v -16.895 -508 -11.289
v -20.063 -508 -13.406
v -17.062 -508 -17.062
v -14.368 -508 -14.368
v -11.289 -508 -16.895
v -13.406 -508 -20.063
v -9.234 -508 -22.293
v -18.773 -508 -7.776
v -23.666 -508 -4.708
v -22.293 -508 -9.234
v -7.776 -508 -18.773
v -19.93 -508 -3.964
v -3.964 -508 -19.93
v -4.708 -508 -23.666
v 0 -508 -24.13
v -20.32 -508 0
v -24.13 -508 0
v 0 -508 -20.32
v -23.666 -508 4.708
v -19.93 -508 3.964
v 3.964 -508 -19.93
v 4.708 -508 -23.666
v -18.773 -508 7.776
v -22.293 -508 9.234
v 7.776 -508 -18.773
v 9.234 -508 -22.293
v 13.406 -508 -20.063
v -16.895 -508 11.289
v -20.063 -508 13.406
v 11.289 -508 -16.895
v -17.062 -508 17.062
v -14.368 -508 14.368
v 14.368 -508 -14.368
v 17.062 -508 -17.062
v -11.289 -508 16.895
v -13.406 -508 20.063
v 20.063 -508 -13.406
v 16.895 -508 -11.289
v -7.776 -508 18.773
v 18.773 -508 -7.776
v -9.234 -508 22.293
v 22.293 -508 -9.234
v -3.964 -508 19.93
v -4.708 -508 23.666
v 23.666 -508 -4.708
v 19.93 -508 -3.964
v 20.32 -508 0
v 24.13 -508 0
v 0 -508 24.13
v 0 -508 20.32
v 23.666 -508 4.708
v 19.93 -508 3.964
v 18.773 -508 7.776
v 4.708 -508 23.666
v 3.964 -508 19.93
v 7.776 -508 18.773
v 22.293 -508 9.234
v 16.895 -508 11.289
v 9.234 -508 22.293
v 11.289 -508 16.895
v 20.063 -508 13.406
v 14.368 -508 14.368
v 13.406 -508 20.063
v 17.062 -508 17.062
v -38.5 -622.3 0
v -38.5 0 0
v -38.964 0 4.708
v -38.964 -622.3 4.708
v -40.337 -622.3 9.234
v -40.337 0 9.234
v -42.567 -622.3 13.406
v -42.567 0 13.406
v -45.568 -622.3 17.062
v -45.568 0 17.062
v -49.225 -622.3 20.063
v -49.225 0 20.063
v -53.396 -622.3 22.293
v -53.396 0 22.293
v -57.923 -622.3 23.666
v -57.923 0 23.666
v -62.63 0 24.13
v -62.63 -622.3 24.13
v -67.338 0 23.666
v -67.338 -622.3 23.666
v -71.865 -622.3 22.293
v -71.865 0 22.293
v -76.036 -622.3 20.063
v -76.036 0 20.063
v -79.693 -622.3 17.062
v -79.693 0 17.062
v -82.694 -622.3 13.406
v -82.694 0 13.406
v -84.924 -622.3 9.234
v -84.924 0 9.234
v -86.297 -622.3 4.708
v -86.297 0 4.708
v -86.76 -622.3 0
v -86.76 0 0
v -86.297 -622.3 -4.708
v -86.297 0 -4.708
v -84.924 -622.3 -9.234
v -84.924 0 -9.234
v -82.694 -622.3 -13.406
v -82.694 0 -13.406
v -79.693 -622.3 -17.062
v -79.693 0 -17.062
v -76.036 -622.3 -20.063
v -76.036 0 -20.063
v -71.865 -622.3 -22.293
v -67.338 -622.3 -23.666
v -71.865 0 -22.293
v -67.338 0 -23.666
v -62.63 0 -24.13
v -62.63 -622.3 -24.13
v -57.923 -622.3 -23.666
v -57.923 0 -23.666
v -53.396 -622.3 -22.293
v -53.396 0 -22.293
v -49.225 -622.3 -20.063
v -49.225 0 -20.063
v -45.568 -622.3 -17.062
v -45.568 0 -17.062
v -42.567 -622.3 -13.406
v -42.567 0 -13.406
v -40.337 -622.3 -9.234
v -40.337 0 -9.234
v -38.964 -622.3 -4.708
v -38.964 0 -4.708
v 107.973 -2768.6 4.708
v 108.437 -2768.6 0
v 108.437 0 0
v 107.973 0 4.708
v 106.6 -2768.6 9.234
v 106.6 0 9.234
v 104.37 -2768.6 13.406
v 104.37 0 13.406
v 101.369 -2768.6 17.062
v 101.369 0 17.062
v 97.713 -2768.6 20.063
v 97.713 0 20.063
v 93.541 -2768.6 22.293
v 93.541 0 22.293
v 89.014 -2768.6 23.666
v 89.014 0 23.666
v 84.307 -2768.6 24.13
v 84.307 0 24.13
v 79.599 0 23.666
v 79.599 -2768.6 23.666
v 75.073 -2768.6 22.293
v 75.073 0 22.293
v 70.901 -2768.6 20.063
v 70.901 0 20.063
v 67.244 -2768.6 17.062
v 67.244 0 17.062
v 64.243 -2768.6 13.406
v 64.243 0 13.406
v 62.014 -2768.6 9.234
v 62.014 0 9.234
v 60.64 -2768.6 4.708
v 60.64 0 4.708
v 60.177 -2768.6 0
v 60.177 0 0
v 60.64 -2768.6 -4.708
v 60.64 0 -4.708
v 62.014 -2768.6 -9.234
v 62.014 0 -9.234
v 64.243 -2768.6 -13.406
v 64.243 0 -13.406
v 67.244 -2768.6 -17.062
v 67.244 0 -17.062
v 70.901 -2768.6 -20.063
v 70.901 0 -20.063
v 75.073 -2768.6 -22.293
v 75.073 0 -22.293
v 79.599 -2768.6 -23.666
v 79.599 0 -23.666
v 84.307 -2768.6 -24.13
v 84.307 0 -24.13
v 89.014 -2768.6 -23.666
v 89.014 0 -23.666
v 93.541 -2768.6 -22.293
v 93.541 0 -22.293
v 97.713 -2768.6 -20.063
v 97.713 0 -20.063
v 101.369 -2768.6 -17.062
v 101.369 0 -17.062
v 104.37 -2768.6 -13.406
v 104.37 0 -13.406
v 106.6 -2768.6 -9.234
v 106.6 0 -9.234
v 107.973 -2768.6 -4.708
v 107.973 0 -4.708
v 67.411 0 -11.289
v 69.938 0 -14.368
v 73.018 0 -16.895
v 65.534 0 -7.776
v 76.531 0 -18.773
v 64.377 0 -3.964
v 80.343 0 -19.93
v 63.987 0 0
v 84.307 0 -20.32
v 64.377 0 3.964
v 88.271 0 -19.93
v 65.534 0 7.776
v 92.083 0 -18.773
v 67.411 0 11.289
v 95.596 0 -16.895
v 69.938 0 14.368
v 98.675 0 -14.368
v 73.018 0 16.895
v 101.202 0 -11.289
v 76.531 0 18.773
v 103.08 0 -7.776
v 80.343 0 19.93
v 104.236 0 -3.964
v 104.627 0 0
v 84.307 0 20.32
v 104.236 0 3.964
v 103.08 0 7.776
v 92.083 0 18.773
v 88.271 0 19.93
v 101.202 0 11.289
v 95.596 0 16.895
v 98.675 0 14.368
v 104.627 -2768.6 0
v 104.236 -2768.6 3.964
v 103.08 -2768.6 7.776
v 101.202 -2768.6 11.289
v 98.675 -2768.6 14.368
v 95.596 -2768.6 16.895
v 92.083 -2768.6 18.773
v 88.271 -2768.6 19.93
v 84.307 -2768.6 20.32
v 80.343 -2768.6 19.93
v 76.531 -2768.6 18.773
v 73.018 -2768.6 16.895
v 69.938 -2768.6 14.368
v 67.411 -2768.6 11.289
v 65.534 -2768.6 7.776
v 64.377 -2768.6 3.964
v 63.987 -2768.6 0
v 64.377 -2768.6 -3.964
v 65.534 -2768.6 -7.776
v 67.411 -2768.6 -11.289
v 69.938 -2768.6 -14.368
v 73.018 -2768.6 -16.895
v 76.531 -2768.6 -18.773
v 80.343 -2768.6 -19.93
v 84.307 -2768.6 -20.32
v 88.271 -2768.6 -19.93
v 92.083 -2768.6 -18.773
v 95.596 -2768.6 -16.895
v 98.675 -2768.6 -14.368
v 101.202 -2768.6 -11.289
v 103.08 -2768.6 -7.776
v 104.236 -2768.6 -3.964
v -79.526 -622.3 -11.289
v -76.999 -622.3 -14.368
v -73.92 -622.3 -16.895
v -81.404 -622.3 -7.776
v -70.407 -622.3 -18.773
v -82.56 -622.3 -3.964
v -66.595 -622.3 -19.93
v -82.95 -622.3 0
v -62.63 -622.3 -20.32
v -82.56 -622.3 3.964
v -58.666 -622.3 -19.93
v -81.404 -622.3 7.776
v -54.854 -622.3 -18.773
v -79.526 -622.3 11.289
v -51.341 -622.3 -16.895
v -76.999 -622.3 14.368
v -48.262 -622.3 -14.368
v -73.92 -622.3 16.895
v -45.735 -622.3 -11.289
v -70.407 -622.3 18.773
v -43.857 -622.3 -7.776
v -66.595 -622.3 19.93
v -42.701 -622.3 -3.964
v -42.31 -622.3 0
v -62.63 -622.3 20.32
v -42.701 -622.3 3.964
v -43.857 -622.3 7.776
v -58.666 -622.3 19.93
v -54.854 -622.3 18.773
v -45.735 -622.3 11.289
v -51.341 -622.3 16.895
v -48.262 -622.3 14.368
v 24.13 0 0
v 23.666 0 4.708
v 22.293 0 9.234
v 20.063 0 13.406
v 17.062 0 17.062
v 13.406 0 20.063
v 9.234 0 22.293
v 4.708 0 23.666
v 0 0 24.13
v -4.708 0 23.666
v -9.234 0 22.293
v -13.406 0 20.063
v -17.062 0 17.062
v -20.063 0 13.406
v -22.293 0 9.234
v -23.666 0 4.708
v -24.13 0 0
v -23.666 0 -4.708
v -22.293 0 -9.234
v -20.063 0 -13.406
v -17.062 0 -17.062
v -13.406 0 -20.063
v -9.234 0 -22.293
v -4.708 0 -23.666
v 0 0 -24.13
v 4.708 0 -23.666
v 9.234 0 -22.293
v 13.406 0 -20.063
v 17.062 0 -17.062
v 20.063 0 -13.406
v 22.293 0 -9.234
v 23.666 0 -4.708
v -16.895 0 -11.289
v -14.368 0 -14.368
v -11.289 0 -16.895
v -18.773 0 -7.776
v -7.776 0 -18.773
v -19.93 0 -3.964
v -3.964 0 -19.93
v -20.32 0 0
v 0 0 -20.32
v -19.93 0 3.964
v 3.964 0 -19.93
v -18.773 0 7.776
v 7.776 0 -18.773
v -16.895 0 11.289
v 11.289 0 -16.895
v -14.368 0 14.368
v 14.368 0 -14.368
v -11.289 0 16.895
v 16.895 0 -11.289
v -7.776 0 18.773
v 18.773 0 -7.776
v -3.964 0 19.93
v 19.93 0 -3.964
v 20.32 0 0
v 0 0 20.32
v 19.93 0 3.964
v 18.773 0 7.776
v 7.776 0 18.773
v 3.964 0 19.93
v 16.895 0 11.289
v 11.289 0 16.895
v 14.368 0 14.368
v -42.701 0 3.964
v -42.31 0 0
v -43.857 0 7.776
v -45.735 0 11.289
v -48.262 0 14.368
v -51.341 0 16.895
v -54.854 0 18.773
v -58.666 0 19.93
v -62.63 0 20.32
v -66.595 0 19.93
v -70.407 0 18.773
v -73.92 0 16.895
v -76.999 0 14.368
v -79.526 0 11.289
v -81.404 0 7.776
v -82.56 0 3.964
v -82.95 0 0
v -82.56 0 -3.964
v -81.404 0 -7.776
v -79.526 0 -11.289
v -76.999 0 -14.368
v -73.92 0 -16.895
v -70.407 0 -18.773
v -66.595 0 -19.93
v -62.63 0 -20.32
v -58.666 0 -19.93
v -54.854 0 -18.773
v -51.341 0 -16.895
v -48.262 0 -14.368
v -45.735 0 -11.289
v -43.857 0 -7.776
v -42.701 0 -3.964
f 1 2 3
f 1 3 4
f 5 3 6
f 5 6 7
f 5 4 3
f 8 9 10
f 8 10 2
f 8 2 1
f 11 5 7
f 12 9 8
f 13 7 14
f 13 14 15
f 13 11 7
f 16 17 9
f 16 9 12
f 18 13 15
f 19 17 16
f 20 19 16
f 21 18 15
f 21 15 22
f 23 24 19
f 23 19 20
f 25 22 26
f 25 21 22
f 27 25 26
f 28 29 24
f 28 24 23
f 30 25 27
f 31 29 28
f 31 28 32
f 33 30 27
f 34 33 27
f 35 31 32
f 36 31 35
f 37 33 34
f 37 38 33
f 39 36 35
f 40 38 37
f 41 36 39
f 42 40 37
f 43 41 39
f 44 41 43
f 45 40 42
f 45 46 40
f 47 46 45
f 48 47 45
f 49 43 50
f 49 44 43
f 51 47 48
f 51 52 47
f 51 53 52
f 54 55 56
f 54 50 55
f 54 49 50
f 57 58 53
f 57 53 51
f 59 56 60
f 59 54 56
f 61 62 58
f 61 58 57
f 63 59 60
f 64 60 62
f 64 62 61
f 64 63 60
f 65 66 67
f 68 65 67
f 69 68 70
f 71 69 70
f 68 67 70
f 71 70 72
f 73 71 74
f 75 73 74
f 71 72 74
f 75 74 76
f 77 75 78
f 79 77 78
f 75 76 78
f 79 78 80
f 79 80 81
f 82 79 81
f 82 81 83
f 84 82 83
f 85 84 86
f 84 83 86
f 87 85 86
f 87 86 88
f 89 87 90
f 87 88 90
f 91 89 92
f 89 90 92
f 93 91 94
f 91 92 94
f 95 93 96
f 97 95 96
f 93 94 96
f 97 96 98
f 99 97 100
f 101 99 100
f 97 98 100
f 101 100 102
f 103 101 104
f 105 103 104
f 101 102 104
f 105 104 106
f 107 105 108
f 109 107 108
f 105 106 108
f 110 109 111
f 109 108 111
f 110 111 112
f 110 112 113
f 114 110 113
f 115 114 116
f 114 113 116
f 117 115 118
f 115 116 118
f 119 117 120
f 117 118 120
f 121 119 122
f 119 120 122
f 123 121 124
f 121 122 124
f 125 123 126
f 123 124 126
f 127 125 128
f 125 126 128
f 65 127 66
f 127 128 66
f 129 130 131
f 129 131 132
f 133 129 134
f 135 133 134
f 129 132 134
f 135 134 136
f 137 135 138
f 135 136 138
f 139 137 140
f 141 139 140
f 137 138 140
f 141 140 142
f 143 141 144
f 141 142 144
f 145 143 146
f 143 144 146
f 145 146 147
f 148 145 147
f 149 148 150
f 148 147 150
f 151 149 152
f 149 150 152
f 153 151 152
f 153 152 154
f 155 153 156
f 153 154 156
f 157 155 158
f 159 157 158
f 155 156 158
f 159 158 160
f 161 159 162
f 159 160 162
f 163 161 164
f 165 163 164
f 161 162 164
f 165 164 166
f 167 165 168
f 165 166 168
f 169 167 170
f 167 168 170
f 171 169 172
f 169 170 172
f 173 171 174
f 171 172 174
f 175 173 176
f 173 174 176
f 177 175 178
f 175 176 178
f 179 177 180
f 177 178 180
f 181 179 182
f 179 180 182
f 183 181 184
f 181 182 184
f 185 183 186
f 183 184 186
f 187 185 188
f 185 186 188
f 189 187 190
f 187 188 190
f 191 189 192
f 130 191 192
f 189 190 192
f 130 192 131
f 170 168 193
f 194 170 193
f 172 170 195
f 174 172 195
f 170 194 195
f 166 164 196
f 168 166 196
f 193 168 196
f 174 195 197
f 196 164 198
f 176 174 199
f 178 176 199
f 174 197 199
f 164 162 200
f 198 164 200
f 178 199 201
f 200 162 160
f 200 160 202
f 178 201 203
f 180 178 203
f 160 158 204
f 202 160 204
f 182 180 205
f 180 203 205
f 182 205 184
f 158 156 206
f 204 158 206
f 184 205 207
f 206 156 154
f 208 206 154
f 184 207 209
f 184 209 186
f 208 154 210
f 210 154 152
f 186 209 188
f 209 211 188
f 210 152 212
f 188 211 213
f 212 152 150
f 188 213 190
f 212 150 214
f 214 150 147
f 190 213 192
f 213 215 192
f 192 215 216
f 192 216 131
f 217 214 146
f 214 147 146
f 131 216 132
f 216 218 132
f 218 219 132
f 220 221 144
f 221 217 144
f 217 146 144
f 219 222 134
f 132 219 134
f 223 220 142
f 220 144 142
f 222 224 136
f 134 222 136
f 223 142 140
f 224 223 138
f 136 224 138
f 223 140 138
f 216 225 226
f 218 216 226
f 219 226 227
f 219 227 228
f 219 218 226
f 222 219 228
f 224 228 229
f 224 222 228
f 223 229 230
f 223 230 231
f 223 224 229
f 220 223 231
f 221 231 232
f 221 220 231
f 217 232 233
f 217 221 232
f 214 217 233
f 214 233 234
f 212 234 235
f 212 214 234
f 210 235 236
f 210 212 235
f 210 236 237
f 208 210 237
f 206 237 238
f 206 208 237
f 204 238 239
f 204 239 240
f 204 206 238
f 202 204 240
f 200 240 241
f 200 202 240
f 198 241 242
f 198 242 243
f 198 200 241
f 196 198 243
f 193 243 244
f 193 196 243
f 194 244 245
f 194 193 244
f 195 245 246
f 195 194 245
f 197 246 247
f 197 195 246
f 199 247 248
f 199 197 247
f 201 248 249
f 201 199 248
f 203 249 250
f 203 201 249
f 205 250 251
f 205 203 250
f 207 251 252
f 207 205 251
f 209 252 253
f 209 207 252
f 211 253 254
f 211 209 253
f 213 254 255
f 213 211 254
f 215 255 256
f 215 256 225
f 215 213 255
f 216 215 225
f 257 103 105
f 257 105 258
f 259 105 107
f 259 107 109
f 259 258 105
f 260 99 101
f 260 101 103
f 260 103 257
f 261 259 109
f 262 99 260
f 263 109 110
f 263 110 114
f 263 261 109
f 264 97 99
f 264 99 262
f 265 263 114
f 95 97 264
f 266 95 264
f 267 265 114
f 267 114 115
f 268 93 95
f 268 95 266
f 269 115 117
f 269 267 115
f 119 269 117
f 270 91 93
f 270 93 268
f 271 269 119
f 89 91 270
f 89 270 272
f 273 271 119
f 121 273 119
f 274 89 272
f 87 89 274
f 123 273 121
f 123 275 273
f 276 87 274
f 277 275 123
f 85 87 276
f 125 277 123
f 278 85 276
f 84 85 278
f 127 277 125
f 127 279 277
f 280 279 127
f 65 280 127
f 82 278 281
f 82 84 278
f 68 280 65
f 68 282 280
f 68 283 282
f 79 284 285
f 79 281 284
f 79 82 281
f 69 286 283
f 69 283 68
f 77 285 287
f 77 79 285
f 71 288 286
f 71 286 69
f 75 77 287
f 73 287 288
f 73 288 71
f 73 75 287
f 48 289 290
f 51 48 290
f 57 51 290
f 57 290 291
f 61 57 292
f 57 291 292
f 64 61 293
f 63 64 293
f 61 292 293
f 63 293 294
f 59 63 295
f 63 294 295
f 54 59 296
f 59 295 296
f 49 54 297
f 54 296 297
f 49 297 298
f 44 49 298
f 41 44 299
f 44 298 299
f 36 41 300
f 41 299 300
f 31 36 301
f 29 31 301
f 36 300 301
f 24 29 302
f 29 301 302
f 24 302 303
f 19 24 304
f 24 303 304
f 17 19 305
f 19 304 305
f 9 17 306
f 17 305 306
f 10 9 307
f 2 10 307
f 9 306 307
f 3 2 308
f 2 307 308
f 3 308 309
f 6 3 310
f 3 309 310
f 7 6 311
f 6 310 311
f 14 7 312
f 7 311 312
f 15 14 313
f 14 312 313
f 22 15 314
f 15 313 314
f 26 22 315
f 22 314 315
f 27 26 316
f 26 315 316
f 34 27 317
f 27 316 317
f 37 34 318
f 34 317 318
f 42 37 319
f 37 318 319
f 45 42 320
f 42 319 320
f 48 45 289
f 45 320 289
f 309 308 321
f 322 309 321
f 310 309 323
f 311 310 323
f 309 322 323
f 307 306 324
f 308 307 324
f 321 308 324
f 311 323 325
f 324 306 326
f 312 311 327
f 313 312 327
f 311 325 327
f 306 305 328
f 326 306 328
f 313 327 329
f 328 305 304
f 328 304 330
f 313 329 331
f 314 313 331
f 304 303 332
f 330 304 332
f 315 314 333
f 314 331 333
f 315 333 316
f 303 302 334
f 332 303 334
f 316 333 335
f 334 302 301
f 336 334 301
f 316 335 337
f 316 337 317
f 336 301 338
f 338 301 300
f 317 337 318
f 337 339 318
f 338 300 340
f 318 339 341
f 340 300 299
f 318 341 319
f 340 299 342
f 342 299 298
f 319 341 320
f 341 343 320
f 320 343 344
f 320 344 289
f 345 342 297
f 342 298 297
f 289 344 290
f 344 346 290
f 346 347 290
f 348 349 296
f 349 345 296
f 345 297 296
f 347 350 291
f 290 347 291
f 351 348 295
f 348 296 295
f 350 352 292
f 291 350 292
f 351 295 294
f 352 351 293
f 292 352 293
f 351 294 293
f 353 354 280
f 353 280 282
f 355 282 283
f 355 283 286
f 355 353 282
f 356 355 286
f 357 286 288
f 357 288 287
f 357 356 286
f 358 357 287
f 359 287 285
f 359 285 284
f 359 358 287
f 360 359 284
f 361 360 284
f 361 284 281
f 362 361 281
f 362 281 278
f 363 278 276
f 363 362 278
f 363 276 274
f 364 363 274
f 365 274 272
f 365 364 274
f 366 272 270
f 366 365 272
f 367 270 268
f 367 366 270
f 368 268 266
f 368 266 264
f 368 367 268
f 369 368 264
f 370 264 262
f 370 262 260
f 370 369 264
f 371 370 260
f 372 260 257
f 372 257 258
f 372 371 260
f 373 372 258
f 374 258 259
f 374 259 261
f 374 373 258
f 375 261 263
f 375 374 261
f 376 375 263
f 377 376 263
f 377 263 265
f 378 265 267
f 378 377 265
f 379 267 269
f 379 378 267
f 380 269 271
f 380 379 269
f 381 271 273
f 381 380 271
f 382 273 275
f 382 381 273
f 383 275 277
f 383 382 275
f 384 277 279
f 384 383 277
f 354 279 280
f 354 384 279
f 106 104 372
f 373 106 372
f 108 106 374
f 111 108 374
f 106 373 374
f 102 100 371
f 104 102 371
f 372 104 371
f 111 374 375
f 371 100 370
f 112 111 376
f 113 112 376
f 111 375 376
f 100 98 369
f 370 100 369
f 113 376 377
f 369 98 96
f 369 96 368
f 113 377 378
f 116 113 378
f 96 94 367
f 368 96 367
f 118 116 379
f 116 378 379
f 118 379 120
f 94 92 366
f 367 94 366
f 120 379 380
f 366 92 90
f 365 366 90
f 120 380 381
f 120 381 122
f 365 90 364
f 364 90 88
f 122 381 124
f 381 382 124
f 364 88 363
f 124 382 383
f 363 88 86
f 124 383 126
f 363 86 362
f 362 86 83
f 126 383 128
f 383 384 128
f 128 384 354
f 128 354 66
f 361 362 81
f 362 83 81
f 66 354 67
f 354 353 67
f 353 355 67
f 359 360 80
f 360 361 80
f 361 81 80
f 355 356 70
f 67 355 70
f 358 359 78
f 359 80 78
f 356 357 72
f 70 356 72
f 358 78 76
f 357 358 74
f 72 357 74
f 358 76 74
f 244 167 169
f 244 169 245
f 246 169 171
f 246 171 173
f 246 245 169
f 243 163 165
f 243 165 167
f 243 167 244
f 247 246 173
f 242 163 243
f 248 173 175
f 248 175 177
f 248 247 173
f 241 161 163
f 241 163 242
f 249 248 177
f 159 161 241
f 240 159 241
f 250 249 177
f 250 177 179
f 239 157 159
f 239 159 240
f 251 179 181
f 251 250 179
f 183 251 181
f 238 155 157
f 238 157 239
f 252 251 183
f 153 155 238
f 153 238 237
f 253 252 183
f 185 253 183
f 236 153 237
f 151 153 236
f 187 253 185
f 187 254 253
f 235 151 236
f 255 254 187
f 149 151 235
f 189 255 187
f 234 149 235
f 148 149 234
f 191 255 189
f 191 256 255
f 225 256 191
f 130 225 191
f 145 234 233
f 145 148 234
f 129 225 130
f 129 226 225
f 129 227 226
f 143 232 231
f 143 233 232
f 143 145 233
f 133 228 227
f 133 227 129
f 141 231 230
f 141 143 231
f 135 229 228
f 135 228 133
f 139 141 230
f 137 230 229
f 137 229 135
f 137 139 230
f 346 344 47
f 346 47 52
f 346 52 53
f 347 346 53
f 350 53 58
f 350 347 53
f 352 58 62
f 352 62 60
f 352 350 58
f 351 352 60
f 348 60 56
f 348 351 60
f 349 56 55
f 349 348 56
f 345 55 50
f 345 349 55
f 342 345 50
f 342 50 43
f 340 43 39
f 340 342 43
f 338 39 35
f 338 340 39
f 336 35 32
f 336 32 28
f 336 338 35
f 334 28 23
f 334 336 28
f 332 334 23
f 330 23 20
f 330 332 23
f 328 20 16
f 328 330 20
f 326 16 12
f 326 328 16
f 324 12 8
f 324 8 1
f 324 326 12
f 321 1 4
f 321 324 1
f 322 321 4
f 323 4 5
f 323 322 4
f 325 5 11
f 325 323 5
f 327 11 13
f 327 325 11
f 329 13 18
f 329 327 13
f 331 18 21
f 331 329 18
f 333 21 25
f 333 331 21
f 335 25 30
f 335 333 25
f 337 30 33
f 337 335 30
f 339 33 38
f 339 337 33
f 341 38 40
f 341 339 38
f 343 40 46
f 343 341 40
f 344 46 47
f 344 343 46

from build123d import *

# Parameters (mm, degrees)
F0_R     = 24.13
F0_R_2   = 20.32
F1_DEPTH = 508
F2_R     = 24.13
F2_R_2   = 20.32
F3_DEPTH = 2768.6
F4_R     = 24.13
F4_R_2   = 20.32
F5_DEPTH = 622.3


with BuildPart() as f1:
    # F0 (on Front) → F1 (new body)
    with BuildSketch(Plane.XZ):
        Circle(F0_R)
        Circle(F0_R_2, mode=Mode.SUBTRACT)
    extrude(amount=F1_DEPTH)


with BuildPart() as f3:
    # F2 (on Front) → F3 (new body)
    with BuildSketch(Plane.XZ):
        with Locations((84.306789, 0)):
            Circle(F2_R)
        with Locations((84.306789, 0)):
            Circle(F2_R_2, mode=Mode.SUBTRACT)
    extrude(amount=F3_DEPTH)


with BuildPart() as f5:
    # F4 (on Front) → F5 (new body)
    with BuildSketch(Plane.XZ):
        with Locations((-62.63041, 0)):
            Circle(F4_R)
        with Locations((-62.63041, 0)):
            Circle(F4_R_2, mode=Mode.SUBTRACT)
    extrude(amount=F5_DEPTH)


solid = Compound([f1.part, f3.part, f5.part])
